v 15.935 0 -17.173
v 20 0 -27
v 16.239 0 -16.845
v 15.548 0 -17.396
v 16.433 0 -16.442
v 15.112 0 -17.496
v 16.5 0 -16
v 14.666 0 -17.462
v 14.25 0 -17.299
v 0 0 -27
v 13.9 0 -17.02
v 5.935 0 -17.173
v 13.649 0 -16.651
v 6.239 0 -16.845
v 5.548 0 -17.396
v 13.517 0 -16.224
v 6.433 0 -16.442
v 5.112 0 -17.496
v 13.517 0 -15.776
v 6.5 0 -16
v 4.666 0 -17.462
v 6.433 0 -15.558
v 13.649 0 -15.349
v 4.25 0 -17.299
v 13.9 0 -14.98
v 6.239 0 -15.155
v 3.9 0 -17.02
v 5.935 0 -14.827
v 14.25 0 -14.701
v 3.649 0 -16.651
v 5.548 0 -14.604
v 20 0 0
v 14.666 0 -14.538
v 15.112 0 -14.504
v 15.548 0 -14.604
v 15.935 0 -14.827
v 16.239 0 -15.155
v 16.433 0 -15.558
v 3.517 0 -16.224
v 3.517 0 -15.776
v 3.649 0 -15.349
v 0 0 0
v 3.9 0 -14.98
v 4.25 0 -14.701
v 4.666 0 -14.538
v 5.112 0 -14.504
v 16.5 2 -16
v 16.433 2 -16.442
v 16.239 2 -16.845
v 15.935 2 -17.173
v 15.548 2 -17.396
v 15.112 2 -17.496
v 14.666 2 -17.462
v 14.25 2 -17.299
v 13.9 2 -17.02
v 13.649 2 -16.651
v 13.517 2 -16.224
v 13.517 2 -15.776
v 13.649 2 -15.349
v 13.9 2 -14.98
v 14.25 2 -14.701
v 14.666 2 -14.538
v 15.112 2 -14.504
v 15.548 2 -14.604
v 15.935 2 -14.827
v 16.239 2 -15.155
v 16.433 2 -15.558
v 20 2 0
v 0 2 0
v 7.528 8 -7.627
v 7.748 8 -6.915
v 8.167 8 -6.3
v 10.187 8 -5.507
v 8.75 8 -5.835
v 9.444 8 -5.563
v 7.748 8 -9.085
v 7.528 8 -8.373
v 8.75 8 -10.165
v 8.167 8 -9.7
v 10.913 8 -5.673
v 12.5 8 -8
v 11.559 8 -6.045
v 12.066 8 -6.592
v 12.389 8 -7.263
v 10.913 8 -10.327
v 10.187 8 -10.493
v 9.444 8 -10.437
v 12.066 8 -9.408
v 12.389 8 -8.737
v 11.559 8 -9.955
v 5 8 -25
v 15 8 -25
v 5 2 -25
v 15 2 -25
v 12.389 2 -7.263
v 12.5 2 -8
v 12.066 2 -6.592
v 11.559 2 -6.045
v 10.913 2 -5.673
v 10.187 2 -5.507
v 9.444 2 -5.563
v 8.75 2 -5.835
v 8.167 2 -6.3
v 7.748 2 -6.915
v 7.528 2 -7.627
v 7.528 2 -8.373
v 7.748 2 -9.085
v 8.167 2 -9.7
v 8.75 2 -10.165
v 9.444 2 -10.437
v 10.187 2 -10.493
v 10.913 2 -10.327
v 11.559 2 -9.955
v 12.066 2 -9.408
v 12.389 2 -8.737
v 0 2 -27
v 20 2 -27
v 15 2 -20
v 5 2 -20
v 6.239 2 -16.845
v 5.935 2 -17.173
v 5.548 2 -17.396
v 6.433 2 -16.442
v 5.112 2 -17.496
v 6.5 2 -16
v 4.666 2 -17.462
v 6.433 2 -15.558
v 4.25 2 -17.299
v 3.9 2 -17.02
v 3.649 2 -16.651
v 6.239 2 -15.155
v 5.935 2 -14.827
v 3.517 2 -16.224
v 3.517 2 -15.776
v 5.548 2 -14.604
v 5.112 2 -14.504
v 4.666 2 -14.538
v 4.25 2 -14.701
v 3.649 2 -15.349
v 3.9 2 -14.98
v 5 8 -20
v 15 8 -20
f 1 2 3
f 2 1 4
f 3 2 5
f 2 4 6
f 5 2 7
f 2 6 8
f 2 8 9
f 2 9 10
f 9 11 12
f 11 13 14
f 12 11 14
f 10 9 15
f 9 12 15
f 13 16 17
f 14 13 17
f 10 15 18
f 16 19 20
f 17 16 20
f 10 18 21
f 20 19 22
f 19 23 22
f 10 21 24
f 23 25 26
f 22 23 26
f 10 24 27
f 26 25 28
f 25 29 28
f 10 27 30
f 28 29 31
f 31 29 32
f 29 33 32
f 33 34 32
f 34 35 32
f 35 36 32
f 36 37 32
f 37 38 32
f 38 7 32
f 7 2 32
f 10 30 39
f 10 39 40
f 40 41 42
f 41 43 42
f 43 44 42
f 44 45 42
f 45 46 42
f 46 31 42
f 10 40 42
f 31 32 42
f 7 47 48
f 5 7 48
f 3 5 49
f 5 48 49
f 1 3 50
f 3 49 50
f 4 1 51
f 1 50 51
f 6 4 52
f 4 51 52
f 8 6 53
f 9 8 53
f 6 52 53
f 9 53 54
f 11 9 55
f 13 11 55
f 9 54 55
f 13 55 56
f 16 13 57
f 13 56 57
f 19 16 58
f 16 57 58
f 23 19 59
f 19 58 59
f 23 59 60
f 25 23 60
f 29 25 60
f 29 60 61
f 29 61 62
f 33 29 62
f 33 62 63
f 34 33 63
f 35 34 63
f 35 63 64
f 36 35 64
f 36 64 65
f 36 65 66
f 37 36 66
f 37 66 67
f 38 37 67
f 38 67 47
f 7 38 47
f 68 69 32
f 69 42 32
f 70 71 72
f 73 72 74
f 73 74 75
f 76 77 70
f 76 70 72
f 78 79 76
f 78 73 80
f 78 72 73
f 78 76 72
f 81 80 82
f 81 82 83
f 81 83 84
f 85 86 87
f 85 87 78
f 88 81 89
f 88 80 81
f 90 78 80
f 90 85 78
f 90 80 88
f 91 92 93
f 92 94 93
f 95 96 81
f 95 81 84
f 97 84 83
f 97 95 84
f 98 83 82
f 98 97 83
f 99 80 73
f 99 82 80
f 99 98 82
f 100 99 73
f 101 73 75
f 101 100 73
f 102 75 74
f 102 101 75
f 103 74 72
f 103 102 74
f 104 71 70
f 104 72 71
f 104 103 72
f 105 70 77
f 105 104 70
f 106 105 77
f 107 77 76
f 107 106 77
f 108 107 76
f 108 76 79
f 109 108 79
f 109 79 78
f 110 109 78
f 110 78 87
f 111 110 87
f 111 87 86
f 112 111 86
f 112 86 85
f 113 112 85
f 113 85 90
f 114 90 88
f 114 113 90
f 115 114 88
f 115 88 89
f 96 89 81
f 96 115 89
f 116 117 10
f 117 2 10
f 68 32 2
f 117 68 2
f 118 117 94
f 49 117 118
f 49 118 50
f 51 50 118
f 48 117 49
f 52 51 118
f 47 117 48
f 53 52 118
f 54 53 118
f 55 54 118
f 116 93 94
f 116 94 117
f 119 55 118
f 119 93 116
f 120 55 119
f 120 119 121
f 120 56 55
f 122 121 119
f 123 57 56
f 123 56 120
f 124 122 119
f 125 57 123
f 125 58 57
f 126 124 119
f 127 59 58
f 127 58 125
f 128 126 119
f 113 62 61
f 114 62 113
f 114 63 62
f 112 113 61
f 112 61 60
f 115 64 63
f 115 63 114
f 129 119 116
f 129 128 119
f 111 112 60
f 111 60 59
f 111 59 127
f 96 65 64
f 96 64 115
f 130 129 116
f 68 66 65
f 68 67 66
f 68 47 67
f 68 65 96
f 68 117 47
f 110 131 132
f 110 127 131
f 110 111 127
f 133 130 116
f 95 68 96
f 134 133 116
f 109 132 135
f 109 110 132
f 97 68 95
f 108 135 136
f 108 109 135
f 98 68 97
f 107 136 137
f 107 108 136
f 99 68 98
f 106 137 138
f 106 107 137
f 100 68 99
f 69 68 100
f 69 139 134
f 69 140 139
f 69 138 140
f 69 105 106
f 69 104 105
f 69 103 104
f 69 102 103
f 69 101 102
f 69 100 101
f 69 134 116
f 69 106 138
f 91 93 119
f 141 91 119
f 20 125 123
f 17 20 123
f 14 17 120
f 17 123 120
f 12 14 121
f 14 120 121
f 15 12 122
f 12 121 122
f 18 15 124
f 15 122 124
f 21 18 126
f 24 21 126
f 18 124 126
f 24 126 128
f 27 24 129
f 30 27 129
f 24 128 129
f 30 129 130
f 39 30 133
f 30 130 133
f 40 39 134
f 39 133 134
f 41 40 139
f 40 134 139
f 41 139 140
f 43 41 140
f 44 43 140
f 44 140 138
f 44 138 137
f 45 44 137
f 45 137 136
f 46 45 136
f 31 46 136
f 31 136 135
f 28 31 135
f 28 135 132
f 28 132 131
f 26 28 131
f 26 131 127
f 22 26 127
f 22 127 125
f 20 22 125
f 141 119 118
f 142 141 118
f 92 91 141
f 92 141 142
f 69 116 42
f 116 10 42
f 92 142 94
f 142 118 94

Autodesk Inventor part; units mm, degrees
ref_plane "YZ Plane" through (0, 0, 0) normal (1, 0, 0) x (0, 1, 0)
ref_plane "XZ Plane" through (0, 0, 0) normal (0, 1, 0) x (-1, 0, 0)
ref_plane "XY Plane" through (0, 0, 0) normal (0, 0, 1) x (1, 0, 0)
sketch "스케치1" plane through (0, 0, 0) normal (0, 1, 0) x (-1, 0, 0)
  line L0 (0, 0) -> (-20, 0)
  line L1 (-20, 0) -> (-20, -27)
  line L2 (-20, -27) -> (0, -27)
  line L3 (0, -27) -> (0, 0)
  dimension "d0" = 20
  dimension "d1" = 27
extrude "돌출1" add sketch "스케치1" along normal blind 2
sketch "스케치2" plane through (0, 2, 0) normal (0, 1, 0) x (1, 0, 0)
  line L0 (0, 0) -> (20, 0) projected
  line L1 (20, 0) -> (20, 27) projected
  line L2 (20, 27) -> (0, 27) projected
  line L3 (0, 27) -> (0, 0) projected
  line L4 (5, 20) -> (15, 20)
  line L5 (15, 20) -> (15, 25)
  line L6 (15, 25) -> (5, 25)
  line L7 (5, 25) -> (5, 20)
  dimension "d4" = 5
  dimension "d5" = 2
  dimension "d6" = 5
  dimension "d7" = 10
extrude "돌출2" add sketch "스케치2" along normal blind 6 contours L7 L6 L5 L4
sketch "스케치3" plane through (0, 2, 0) normal (0, 1, 0) x (1, 0, 0)
  line L0 (5, 20) -> (5, 25) projected
  line L1 (5, 25) -> (15, 25) projected
  line L2 (15, 25) -> (15, 20) projected
  line L3 (15, 20) -> (5, 20) projected
  line L4 (0, 0) -> (20, 0) projected
  line L5 (20, 0) -> (20, 27) projected
  line L6 (20, 27) -> (0, 27) projected
  line L7 (0, 27) -> (0, 0) projected
  circle A0 centre (10, 8) radius 2.5
  dimension "d10" = 5
  dimension "d11" = 8
extrude "돌출3" add sketch "스케치3" along normal blind 6 contours A0
sketch "스케치4" plane through (0, 2, 0) normal (0, 1, 0) x (1, 0, 0)
  circle A0 centre (10, 8) radius 2.5 projected
  line L0 (5, 20) -> (5, 25) projected
  line L1 (5, 25) -> (15, 25) projected
  line L2 (15, 25) -> (15, 20) projected
  line L3 (15, 20) -> (5, 20) projected
  line L4 (0, 0) -> (20, 0) projected
  line L5 (20, 0) -> (20, 27) projected
  line L6 (20, 27) -> (0, 27) projected
  line L7 (0, 27) -> (0, 0) projected
  circle A1 centre (5, 16) radius 1.5
  circle A2 centre (15, 16) radius 1.5
  dimension "d14" = 3
  dimension "d15" = 3
  dimension "d16" = 5
  dimension "d17" = 11
  dimension "d18" = 11
  dimension "d19" = 5
extrude "돌출4" cut sketch "스케치4" against normal blind 6 contours A1 | A2
properties part number "CdS모듈"
